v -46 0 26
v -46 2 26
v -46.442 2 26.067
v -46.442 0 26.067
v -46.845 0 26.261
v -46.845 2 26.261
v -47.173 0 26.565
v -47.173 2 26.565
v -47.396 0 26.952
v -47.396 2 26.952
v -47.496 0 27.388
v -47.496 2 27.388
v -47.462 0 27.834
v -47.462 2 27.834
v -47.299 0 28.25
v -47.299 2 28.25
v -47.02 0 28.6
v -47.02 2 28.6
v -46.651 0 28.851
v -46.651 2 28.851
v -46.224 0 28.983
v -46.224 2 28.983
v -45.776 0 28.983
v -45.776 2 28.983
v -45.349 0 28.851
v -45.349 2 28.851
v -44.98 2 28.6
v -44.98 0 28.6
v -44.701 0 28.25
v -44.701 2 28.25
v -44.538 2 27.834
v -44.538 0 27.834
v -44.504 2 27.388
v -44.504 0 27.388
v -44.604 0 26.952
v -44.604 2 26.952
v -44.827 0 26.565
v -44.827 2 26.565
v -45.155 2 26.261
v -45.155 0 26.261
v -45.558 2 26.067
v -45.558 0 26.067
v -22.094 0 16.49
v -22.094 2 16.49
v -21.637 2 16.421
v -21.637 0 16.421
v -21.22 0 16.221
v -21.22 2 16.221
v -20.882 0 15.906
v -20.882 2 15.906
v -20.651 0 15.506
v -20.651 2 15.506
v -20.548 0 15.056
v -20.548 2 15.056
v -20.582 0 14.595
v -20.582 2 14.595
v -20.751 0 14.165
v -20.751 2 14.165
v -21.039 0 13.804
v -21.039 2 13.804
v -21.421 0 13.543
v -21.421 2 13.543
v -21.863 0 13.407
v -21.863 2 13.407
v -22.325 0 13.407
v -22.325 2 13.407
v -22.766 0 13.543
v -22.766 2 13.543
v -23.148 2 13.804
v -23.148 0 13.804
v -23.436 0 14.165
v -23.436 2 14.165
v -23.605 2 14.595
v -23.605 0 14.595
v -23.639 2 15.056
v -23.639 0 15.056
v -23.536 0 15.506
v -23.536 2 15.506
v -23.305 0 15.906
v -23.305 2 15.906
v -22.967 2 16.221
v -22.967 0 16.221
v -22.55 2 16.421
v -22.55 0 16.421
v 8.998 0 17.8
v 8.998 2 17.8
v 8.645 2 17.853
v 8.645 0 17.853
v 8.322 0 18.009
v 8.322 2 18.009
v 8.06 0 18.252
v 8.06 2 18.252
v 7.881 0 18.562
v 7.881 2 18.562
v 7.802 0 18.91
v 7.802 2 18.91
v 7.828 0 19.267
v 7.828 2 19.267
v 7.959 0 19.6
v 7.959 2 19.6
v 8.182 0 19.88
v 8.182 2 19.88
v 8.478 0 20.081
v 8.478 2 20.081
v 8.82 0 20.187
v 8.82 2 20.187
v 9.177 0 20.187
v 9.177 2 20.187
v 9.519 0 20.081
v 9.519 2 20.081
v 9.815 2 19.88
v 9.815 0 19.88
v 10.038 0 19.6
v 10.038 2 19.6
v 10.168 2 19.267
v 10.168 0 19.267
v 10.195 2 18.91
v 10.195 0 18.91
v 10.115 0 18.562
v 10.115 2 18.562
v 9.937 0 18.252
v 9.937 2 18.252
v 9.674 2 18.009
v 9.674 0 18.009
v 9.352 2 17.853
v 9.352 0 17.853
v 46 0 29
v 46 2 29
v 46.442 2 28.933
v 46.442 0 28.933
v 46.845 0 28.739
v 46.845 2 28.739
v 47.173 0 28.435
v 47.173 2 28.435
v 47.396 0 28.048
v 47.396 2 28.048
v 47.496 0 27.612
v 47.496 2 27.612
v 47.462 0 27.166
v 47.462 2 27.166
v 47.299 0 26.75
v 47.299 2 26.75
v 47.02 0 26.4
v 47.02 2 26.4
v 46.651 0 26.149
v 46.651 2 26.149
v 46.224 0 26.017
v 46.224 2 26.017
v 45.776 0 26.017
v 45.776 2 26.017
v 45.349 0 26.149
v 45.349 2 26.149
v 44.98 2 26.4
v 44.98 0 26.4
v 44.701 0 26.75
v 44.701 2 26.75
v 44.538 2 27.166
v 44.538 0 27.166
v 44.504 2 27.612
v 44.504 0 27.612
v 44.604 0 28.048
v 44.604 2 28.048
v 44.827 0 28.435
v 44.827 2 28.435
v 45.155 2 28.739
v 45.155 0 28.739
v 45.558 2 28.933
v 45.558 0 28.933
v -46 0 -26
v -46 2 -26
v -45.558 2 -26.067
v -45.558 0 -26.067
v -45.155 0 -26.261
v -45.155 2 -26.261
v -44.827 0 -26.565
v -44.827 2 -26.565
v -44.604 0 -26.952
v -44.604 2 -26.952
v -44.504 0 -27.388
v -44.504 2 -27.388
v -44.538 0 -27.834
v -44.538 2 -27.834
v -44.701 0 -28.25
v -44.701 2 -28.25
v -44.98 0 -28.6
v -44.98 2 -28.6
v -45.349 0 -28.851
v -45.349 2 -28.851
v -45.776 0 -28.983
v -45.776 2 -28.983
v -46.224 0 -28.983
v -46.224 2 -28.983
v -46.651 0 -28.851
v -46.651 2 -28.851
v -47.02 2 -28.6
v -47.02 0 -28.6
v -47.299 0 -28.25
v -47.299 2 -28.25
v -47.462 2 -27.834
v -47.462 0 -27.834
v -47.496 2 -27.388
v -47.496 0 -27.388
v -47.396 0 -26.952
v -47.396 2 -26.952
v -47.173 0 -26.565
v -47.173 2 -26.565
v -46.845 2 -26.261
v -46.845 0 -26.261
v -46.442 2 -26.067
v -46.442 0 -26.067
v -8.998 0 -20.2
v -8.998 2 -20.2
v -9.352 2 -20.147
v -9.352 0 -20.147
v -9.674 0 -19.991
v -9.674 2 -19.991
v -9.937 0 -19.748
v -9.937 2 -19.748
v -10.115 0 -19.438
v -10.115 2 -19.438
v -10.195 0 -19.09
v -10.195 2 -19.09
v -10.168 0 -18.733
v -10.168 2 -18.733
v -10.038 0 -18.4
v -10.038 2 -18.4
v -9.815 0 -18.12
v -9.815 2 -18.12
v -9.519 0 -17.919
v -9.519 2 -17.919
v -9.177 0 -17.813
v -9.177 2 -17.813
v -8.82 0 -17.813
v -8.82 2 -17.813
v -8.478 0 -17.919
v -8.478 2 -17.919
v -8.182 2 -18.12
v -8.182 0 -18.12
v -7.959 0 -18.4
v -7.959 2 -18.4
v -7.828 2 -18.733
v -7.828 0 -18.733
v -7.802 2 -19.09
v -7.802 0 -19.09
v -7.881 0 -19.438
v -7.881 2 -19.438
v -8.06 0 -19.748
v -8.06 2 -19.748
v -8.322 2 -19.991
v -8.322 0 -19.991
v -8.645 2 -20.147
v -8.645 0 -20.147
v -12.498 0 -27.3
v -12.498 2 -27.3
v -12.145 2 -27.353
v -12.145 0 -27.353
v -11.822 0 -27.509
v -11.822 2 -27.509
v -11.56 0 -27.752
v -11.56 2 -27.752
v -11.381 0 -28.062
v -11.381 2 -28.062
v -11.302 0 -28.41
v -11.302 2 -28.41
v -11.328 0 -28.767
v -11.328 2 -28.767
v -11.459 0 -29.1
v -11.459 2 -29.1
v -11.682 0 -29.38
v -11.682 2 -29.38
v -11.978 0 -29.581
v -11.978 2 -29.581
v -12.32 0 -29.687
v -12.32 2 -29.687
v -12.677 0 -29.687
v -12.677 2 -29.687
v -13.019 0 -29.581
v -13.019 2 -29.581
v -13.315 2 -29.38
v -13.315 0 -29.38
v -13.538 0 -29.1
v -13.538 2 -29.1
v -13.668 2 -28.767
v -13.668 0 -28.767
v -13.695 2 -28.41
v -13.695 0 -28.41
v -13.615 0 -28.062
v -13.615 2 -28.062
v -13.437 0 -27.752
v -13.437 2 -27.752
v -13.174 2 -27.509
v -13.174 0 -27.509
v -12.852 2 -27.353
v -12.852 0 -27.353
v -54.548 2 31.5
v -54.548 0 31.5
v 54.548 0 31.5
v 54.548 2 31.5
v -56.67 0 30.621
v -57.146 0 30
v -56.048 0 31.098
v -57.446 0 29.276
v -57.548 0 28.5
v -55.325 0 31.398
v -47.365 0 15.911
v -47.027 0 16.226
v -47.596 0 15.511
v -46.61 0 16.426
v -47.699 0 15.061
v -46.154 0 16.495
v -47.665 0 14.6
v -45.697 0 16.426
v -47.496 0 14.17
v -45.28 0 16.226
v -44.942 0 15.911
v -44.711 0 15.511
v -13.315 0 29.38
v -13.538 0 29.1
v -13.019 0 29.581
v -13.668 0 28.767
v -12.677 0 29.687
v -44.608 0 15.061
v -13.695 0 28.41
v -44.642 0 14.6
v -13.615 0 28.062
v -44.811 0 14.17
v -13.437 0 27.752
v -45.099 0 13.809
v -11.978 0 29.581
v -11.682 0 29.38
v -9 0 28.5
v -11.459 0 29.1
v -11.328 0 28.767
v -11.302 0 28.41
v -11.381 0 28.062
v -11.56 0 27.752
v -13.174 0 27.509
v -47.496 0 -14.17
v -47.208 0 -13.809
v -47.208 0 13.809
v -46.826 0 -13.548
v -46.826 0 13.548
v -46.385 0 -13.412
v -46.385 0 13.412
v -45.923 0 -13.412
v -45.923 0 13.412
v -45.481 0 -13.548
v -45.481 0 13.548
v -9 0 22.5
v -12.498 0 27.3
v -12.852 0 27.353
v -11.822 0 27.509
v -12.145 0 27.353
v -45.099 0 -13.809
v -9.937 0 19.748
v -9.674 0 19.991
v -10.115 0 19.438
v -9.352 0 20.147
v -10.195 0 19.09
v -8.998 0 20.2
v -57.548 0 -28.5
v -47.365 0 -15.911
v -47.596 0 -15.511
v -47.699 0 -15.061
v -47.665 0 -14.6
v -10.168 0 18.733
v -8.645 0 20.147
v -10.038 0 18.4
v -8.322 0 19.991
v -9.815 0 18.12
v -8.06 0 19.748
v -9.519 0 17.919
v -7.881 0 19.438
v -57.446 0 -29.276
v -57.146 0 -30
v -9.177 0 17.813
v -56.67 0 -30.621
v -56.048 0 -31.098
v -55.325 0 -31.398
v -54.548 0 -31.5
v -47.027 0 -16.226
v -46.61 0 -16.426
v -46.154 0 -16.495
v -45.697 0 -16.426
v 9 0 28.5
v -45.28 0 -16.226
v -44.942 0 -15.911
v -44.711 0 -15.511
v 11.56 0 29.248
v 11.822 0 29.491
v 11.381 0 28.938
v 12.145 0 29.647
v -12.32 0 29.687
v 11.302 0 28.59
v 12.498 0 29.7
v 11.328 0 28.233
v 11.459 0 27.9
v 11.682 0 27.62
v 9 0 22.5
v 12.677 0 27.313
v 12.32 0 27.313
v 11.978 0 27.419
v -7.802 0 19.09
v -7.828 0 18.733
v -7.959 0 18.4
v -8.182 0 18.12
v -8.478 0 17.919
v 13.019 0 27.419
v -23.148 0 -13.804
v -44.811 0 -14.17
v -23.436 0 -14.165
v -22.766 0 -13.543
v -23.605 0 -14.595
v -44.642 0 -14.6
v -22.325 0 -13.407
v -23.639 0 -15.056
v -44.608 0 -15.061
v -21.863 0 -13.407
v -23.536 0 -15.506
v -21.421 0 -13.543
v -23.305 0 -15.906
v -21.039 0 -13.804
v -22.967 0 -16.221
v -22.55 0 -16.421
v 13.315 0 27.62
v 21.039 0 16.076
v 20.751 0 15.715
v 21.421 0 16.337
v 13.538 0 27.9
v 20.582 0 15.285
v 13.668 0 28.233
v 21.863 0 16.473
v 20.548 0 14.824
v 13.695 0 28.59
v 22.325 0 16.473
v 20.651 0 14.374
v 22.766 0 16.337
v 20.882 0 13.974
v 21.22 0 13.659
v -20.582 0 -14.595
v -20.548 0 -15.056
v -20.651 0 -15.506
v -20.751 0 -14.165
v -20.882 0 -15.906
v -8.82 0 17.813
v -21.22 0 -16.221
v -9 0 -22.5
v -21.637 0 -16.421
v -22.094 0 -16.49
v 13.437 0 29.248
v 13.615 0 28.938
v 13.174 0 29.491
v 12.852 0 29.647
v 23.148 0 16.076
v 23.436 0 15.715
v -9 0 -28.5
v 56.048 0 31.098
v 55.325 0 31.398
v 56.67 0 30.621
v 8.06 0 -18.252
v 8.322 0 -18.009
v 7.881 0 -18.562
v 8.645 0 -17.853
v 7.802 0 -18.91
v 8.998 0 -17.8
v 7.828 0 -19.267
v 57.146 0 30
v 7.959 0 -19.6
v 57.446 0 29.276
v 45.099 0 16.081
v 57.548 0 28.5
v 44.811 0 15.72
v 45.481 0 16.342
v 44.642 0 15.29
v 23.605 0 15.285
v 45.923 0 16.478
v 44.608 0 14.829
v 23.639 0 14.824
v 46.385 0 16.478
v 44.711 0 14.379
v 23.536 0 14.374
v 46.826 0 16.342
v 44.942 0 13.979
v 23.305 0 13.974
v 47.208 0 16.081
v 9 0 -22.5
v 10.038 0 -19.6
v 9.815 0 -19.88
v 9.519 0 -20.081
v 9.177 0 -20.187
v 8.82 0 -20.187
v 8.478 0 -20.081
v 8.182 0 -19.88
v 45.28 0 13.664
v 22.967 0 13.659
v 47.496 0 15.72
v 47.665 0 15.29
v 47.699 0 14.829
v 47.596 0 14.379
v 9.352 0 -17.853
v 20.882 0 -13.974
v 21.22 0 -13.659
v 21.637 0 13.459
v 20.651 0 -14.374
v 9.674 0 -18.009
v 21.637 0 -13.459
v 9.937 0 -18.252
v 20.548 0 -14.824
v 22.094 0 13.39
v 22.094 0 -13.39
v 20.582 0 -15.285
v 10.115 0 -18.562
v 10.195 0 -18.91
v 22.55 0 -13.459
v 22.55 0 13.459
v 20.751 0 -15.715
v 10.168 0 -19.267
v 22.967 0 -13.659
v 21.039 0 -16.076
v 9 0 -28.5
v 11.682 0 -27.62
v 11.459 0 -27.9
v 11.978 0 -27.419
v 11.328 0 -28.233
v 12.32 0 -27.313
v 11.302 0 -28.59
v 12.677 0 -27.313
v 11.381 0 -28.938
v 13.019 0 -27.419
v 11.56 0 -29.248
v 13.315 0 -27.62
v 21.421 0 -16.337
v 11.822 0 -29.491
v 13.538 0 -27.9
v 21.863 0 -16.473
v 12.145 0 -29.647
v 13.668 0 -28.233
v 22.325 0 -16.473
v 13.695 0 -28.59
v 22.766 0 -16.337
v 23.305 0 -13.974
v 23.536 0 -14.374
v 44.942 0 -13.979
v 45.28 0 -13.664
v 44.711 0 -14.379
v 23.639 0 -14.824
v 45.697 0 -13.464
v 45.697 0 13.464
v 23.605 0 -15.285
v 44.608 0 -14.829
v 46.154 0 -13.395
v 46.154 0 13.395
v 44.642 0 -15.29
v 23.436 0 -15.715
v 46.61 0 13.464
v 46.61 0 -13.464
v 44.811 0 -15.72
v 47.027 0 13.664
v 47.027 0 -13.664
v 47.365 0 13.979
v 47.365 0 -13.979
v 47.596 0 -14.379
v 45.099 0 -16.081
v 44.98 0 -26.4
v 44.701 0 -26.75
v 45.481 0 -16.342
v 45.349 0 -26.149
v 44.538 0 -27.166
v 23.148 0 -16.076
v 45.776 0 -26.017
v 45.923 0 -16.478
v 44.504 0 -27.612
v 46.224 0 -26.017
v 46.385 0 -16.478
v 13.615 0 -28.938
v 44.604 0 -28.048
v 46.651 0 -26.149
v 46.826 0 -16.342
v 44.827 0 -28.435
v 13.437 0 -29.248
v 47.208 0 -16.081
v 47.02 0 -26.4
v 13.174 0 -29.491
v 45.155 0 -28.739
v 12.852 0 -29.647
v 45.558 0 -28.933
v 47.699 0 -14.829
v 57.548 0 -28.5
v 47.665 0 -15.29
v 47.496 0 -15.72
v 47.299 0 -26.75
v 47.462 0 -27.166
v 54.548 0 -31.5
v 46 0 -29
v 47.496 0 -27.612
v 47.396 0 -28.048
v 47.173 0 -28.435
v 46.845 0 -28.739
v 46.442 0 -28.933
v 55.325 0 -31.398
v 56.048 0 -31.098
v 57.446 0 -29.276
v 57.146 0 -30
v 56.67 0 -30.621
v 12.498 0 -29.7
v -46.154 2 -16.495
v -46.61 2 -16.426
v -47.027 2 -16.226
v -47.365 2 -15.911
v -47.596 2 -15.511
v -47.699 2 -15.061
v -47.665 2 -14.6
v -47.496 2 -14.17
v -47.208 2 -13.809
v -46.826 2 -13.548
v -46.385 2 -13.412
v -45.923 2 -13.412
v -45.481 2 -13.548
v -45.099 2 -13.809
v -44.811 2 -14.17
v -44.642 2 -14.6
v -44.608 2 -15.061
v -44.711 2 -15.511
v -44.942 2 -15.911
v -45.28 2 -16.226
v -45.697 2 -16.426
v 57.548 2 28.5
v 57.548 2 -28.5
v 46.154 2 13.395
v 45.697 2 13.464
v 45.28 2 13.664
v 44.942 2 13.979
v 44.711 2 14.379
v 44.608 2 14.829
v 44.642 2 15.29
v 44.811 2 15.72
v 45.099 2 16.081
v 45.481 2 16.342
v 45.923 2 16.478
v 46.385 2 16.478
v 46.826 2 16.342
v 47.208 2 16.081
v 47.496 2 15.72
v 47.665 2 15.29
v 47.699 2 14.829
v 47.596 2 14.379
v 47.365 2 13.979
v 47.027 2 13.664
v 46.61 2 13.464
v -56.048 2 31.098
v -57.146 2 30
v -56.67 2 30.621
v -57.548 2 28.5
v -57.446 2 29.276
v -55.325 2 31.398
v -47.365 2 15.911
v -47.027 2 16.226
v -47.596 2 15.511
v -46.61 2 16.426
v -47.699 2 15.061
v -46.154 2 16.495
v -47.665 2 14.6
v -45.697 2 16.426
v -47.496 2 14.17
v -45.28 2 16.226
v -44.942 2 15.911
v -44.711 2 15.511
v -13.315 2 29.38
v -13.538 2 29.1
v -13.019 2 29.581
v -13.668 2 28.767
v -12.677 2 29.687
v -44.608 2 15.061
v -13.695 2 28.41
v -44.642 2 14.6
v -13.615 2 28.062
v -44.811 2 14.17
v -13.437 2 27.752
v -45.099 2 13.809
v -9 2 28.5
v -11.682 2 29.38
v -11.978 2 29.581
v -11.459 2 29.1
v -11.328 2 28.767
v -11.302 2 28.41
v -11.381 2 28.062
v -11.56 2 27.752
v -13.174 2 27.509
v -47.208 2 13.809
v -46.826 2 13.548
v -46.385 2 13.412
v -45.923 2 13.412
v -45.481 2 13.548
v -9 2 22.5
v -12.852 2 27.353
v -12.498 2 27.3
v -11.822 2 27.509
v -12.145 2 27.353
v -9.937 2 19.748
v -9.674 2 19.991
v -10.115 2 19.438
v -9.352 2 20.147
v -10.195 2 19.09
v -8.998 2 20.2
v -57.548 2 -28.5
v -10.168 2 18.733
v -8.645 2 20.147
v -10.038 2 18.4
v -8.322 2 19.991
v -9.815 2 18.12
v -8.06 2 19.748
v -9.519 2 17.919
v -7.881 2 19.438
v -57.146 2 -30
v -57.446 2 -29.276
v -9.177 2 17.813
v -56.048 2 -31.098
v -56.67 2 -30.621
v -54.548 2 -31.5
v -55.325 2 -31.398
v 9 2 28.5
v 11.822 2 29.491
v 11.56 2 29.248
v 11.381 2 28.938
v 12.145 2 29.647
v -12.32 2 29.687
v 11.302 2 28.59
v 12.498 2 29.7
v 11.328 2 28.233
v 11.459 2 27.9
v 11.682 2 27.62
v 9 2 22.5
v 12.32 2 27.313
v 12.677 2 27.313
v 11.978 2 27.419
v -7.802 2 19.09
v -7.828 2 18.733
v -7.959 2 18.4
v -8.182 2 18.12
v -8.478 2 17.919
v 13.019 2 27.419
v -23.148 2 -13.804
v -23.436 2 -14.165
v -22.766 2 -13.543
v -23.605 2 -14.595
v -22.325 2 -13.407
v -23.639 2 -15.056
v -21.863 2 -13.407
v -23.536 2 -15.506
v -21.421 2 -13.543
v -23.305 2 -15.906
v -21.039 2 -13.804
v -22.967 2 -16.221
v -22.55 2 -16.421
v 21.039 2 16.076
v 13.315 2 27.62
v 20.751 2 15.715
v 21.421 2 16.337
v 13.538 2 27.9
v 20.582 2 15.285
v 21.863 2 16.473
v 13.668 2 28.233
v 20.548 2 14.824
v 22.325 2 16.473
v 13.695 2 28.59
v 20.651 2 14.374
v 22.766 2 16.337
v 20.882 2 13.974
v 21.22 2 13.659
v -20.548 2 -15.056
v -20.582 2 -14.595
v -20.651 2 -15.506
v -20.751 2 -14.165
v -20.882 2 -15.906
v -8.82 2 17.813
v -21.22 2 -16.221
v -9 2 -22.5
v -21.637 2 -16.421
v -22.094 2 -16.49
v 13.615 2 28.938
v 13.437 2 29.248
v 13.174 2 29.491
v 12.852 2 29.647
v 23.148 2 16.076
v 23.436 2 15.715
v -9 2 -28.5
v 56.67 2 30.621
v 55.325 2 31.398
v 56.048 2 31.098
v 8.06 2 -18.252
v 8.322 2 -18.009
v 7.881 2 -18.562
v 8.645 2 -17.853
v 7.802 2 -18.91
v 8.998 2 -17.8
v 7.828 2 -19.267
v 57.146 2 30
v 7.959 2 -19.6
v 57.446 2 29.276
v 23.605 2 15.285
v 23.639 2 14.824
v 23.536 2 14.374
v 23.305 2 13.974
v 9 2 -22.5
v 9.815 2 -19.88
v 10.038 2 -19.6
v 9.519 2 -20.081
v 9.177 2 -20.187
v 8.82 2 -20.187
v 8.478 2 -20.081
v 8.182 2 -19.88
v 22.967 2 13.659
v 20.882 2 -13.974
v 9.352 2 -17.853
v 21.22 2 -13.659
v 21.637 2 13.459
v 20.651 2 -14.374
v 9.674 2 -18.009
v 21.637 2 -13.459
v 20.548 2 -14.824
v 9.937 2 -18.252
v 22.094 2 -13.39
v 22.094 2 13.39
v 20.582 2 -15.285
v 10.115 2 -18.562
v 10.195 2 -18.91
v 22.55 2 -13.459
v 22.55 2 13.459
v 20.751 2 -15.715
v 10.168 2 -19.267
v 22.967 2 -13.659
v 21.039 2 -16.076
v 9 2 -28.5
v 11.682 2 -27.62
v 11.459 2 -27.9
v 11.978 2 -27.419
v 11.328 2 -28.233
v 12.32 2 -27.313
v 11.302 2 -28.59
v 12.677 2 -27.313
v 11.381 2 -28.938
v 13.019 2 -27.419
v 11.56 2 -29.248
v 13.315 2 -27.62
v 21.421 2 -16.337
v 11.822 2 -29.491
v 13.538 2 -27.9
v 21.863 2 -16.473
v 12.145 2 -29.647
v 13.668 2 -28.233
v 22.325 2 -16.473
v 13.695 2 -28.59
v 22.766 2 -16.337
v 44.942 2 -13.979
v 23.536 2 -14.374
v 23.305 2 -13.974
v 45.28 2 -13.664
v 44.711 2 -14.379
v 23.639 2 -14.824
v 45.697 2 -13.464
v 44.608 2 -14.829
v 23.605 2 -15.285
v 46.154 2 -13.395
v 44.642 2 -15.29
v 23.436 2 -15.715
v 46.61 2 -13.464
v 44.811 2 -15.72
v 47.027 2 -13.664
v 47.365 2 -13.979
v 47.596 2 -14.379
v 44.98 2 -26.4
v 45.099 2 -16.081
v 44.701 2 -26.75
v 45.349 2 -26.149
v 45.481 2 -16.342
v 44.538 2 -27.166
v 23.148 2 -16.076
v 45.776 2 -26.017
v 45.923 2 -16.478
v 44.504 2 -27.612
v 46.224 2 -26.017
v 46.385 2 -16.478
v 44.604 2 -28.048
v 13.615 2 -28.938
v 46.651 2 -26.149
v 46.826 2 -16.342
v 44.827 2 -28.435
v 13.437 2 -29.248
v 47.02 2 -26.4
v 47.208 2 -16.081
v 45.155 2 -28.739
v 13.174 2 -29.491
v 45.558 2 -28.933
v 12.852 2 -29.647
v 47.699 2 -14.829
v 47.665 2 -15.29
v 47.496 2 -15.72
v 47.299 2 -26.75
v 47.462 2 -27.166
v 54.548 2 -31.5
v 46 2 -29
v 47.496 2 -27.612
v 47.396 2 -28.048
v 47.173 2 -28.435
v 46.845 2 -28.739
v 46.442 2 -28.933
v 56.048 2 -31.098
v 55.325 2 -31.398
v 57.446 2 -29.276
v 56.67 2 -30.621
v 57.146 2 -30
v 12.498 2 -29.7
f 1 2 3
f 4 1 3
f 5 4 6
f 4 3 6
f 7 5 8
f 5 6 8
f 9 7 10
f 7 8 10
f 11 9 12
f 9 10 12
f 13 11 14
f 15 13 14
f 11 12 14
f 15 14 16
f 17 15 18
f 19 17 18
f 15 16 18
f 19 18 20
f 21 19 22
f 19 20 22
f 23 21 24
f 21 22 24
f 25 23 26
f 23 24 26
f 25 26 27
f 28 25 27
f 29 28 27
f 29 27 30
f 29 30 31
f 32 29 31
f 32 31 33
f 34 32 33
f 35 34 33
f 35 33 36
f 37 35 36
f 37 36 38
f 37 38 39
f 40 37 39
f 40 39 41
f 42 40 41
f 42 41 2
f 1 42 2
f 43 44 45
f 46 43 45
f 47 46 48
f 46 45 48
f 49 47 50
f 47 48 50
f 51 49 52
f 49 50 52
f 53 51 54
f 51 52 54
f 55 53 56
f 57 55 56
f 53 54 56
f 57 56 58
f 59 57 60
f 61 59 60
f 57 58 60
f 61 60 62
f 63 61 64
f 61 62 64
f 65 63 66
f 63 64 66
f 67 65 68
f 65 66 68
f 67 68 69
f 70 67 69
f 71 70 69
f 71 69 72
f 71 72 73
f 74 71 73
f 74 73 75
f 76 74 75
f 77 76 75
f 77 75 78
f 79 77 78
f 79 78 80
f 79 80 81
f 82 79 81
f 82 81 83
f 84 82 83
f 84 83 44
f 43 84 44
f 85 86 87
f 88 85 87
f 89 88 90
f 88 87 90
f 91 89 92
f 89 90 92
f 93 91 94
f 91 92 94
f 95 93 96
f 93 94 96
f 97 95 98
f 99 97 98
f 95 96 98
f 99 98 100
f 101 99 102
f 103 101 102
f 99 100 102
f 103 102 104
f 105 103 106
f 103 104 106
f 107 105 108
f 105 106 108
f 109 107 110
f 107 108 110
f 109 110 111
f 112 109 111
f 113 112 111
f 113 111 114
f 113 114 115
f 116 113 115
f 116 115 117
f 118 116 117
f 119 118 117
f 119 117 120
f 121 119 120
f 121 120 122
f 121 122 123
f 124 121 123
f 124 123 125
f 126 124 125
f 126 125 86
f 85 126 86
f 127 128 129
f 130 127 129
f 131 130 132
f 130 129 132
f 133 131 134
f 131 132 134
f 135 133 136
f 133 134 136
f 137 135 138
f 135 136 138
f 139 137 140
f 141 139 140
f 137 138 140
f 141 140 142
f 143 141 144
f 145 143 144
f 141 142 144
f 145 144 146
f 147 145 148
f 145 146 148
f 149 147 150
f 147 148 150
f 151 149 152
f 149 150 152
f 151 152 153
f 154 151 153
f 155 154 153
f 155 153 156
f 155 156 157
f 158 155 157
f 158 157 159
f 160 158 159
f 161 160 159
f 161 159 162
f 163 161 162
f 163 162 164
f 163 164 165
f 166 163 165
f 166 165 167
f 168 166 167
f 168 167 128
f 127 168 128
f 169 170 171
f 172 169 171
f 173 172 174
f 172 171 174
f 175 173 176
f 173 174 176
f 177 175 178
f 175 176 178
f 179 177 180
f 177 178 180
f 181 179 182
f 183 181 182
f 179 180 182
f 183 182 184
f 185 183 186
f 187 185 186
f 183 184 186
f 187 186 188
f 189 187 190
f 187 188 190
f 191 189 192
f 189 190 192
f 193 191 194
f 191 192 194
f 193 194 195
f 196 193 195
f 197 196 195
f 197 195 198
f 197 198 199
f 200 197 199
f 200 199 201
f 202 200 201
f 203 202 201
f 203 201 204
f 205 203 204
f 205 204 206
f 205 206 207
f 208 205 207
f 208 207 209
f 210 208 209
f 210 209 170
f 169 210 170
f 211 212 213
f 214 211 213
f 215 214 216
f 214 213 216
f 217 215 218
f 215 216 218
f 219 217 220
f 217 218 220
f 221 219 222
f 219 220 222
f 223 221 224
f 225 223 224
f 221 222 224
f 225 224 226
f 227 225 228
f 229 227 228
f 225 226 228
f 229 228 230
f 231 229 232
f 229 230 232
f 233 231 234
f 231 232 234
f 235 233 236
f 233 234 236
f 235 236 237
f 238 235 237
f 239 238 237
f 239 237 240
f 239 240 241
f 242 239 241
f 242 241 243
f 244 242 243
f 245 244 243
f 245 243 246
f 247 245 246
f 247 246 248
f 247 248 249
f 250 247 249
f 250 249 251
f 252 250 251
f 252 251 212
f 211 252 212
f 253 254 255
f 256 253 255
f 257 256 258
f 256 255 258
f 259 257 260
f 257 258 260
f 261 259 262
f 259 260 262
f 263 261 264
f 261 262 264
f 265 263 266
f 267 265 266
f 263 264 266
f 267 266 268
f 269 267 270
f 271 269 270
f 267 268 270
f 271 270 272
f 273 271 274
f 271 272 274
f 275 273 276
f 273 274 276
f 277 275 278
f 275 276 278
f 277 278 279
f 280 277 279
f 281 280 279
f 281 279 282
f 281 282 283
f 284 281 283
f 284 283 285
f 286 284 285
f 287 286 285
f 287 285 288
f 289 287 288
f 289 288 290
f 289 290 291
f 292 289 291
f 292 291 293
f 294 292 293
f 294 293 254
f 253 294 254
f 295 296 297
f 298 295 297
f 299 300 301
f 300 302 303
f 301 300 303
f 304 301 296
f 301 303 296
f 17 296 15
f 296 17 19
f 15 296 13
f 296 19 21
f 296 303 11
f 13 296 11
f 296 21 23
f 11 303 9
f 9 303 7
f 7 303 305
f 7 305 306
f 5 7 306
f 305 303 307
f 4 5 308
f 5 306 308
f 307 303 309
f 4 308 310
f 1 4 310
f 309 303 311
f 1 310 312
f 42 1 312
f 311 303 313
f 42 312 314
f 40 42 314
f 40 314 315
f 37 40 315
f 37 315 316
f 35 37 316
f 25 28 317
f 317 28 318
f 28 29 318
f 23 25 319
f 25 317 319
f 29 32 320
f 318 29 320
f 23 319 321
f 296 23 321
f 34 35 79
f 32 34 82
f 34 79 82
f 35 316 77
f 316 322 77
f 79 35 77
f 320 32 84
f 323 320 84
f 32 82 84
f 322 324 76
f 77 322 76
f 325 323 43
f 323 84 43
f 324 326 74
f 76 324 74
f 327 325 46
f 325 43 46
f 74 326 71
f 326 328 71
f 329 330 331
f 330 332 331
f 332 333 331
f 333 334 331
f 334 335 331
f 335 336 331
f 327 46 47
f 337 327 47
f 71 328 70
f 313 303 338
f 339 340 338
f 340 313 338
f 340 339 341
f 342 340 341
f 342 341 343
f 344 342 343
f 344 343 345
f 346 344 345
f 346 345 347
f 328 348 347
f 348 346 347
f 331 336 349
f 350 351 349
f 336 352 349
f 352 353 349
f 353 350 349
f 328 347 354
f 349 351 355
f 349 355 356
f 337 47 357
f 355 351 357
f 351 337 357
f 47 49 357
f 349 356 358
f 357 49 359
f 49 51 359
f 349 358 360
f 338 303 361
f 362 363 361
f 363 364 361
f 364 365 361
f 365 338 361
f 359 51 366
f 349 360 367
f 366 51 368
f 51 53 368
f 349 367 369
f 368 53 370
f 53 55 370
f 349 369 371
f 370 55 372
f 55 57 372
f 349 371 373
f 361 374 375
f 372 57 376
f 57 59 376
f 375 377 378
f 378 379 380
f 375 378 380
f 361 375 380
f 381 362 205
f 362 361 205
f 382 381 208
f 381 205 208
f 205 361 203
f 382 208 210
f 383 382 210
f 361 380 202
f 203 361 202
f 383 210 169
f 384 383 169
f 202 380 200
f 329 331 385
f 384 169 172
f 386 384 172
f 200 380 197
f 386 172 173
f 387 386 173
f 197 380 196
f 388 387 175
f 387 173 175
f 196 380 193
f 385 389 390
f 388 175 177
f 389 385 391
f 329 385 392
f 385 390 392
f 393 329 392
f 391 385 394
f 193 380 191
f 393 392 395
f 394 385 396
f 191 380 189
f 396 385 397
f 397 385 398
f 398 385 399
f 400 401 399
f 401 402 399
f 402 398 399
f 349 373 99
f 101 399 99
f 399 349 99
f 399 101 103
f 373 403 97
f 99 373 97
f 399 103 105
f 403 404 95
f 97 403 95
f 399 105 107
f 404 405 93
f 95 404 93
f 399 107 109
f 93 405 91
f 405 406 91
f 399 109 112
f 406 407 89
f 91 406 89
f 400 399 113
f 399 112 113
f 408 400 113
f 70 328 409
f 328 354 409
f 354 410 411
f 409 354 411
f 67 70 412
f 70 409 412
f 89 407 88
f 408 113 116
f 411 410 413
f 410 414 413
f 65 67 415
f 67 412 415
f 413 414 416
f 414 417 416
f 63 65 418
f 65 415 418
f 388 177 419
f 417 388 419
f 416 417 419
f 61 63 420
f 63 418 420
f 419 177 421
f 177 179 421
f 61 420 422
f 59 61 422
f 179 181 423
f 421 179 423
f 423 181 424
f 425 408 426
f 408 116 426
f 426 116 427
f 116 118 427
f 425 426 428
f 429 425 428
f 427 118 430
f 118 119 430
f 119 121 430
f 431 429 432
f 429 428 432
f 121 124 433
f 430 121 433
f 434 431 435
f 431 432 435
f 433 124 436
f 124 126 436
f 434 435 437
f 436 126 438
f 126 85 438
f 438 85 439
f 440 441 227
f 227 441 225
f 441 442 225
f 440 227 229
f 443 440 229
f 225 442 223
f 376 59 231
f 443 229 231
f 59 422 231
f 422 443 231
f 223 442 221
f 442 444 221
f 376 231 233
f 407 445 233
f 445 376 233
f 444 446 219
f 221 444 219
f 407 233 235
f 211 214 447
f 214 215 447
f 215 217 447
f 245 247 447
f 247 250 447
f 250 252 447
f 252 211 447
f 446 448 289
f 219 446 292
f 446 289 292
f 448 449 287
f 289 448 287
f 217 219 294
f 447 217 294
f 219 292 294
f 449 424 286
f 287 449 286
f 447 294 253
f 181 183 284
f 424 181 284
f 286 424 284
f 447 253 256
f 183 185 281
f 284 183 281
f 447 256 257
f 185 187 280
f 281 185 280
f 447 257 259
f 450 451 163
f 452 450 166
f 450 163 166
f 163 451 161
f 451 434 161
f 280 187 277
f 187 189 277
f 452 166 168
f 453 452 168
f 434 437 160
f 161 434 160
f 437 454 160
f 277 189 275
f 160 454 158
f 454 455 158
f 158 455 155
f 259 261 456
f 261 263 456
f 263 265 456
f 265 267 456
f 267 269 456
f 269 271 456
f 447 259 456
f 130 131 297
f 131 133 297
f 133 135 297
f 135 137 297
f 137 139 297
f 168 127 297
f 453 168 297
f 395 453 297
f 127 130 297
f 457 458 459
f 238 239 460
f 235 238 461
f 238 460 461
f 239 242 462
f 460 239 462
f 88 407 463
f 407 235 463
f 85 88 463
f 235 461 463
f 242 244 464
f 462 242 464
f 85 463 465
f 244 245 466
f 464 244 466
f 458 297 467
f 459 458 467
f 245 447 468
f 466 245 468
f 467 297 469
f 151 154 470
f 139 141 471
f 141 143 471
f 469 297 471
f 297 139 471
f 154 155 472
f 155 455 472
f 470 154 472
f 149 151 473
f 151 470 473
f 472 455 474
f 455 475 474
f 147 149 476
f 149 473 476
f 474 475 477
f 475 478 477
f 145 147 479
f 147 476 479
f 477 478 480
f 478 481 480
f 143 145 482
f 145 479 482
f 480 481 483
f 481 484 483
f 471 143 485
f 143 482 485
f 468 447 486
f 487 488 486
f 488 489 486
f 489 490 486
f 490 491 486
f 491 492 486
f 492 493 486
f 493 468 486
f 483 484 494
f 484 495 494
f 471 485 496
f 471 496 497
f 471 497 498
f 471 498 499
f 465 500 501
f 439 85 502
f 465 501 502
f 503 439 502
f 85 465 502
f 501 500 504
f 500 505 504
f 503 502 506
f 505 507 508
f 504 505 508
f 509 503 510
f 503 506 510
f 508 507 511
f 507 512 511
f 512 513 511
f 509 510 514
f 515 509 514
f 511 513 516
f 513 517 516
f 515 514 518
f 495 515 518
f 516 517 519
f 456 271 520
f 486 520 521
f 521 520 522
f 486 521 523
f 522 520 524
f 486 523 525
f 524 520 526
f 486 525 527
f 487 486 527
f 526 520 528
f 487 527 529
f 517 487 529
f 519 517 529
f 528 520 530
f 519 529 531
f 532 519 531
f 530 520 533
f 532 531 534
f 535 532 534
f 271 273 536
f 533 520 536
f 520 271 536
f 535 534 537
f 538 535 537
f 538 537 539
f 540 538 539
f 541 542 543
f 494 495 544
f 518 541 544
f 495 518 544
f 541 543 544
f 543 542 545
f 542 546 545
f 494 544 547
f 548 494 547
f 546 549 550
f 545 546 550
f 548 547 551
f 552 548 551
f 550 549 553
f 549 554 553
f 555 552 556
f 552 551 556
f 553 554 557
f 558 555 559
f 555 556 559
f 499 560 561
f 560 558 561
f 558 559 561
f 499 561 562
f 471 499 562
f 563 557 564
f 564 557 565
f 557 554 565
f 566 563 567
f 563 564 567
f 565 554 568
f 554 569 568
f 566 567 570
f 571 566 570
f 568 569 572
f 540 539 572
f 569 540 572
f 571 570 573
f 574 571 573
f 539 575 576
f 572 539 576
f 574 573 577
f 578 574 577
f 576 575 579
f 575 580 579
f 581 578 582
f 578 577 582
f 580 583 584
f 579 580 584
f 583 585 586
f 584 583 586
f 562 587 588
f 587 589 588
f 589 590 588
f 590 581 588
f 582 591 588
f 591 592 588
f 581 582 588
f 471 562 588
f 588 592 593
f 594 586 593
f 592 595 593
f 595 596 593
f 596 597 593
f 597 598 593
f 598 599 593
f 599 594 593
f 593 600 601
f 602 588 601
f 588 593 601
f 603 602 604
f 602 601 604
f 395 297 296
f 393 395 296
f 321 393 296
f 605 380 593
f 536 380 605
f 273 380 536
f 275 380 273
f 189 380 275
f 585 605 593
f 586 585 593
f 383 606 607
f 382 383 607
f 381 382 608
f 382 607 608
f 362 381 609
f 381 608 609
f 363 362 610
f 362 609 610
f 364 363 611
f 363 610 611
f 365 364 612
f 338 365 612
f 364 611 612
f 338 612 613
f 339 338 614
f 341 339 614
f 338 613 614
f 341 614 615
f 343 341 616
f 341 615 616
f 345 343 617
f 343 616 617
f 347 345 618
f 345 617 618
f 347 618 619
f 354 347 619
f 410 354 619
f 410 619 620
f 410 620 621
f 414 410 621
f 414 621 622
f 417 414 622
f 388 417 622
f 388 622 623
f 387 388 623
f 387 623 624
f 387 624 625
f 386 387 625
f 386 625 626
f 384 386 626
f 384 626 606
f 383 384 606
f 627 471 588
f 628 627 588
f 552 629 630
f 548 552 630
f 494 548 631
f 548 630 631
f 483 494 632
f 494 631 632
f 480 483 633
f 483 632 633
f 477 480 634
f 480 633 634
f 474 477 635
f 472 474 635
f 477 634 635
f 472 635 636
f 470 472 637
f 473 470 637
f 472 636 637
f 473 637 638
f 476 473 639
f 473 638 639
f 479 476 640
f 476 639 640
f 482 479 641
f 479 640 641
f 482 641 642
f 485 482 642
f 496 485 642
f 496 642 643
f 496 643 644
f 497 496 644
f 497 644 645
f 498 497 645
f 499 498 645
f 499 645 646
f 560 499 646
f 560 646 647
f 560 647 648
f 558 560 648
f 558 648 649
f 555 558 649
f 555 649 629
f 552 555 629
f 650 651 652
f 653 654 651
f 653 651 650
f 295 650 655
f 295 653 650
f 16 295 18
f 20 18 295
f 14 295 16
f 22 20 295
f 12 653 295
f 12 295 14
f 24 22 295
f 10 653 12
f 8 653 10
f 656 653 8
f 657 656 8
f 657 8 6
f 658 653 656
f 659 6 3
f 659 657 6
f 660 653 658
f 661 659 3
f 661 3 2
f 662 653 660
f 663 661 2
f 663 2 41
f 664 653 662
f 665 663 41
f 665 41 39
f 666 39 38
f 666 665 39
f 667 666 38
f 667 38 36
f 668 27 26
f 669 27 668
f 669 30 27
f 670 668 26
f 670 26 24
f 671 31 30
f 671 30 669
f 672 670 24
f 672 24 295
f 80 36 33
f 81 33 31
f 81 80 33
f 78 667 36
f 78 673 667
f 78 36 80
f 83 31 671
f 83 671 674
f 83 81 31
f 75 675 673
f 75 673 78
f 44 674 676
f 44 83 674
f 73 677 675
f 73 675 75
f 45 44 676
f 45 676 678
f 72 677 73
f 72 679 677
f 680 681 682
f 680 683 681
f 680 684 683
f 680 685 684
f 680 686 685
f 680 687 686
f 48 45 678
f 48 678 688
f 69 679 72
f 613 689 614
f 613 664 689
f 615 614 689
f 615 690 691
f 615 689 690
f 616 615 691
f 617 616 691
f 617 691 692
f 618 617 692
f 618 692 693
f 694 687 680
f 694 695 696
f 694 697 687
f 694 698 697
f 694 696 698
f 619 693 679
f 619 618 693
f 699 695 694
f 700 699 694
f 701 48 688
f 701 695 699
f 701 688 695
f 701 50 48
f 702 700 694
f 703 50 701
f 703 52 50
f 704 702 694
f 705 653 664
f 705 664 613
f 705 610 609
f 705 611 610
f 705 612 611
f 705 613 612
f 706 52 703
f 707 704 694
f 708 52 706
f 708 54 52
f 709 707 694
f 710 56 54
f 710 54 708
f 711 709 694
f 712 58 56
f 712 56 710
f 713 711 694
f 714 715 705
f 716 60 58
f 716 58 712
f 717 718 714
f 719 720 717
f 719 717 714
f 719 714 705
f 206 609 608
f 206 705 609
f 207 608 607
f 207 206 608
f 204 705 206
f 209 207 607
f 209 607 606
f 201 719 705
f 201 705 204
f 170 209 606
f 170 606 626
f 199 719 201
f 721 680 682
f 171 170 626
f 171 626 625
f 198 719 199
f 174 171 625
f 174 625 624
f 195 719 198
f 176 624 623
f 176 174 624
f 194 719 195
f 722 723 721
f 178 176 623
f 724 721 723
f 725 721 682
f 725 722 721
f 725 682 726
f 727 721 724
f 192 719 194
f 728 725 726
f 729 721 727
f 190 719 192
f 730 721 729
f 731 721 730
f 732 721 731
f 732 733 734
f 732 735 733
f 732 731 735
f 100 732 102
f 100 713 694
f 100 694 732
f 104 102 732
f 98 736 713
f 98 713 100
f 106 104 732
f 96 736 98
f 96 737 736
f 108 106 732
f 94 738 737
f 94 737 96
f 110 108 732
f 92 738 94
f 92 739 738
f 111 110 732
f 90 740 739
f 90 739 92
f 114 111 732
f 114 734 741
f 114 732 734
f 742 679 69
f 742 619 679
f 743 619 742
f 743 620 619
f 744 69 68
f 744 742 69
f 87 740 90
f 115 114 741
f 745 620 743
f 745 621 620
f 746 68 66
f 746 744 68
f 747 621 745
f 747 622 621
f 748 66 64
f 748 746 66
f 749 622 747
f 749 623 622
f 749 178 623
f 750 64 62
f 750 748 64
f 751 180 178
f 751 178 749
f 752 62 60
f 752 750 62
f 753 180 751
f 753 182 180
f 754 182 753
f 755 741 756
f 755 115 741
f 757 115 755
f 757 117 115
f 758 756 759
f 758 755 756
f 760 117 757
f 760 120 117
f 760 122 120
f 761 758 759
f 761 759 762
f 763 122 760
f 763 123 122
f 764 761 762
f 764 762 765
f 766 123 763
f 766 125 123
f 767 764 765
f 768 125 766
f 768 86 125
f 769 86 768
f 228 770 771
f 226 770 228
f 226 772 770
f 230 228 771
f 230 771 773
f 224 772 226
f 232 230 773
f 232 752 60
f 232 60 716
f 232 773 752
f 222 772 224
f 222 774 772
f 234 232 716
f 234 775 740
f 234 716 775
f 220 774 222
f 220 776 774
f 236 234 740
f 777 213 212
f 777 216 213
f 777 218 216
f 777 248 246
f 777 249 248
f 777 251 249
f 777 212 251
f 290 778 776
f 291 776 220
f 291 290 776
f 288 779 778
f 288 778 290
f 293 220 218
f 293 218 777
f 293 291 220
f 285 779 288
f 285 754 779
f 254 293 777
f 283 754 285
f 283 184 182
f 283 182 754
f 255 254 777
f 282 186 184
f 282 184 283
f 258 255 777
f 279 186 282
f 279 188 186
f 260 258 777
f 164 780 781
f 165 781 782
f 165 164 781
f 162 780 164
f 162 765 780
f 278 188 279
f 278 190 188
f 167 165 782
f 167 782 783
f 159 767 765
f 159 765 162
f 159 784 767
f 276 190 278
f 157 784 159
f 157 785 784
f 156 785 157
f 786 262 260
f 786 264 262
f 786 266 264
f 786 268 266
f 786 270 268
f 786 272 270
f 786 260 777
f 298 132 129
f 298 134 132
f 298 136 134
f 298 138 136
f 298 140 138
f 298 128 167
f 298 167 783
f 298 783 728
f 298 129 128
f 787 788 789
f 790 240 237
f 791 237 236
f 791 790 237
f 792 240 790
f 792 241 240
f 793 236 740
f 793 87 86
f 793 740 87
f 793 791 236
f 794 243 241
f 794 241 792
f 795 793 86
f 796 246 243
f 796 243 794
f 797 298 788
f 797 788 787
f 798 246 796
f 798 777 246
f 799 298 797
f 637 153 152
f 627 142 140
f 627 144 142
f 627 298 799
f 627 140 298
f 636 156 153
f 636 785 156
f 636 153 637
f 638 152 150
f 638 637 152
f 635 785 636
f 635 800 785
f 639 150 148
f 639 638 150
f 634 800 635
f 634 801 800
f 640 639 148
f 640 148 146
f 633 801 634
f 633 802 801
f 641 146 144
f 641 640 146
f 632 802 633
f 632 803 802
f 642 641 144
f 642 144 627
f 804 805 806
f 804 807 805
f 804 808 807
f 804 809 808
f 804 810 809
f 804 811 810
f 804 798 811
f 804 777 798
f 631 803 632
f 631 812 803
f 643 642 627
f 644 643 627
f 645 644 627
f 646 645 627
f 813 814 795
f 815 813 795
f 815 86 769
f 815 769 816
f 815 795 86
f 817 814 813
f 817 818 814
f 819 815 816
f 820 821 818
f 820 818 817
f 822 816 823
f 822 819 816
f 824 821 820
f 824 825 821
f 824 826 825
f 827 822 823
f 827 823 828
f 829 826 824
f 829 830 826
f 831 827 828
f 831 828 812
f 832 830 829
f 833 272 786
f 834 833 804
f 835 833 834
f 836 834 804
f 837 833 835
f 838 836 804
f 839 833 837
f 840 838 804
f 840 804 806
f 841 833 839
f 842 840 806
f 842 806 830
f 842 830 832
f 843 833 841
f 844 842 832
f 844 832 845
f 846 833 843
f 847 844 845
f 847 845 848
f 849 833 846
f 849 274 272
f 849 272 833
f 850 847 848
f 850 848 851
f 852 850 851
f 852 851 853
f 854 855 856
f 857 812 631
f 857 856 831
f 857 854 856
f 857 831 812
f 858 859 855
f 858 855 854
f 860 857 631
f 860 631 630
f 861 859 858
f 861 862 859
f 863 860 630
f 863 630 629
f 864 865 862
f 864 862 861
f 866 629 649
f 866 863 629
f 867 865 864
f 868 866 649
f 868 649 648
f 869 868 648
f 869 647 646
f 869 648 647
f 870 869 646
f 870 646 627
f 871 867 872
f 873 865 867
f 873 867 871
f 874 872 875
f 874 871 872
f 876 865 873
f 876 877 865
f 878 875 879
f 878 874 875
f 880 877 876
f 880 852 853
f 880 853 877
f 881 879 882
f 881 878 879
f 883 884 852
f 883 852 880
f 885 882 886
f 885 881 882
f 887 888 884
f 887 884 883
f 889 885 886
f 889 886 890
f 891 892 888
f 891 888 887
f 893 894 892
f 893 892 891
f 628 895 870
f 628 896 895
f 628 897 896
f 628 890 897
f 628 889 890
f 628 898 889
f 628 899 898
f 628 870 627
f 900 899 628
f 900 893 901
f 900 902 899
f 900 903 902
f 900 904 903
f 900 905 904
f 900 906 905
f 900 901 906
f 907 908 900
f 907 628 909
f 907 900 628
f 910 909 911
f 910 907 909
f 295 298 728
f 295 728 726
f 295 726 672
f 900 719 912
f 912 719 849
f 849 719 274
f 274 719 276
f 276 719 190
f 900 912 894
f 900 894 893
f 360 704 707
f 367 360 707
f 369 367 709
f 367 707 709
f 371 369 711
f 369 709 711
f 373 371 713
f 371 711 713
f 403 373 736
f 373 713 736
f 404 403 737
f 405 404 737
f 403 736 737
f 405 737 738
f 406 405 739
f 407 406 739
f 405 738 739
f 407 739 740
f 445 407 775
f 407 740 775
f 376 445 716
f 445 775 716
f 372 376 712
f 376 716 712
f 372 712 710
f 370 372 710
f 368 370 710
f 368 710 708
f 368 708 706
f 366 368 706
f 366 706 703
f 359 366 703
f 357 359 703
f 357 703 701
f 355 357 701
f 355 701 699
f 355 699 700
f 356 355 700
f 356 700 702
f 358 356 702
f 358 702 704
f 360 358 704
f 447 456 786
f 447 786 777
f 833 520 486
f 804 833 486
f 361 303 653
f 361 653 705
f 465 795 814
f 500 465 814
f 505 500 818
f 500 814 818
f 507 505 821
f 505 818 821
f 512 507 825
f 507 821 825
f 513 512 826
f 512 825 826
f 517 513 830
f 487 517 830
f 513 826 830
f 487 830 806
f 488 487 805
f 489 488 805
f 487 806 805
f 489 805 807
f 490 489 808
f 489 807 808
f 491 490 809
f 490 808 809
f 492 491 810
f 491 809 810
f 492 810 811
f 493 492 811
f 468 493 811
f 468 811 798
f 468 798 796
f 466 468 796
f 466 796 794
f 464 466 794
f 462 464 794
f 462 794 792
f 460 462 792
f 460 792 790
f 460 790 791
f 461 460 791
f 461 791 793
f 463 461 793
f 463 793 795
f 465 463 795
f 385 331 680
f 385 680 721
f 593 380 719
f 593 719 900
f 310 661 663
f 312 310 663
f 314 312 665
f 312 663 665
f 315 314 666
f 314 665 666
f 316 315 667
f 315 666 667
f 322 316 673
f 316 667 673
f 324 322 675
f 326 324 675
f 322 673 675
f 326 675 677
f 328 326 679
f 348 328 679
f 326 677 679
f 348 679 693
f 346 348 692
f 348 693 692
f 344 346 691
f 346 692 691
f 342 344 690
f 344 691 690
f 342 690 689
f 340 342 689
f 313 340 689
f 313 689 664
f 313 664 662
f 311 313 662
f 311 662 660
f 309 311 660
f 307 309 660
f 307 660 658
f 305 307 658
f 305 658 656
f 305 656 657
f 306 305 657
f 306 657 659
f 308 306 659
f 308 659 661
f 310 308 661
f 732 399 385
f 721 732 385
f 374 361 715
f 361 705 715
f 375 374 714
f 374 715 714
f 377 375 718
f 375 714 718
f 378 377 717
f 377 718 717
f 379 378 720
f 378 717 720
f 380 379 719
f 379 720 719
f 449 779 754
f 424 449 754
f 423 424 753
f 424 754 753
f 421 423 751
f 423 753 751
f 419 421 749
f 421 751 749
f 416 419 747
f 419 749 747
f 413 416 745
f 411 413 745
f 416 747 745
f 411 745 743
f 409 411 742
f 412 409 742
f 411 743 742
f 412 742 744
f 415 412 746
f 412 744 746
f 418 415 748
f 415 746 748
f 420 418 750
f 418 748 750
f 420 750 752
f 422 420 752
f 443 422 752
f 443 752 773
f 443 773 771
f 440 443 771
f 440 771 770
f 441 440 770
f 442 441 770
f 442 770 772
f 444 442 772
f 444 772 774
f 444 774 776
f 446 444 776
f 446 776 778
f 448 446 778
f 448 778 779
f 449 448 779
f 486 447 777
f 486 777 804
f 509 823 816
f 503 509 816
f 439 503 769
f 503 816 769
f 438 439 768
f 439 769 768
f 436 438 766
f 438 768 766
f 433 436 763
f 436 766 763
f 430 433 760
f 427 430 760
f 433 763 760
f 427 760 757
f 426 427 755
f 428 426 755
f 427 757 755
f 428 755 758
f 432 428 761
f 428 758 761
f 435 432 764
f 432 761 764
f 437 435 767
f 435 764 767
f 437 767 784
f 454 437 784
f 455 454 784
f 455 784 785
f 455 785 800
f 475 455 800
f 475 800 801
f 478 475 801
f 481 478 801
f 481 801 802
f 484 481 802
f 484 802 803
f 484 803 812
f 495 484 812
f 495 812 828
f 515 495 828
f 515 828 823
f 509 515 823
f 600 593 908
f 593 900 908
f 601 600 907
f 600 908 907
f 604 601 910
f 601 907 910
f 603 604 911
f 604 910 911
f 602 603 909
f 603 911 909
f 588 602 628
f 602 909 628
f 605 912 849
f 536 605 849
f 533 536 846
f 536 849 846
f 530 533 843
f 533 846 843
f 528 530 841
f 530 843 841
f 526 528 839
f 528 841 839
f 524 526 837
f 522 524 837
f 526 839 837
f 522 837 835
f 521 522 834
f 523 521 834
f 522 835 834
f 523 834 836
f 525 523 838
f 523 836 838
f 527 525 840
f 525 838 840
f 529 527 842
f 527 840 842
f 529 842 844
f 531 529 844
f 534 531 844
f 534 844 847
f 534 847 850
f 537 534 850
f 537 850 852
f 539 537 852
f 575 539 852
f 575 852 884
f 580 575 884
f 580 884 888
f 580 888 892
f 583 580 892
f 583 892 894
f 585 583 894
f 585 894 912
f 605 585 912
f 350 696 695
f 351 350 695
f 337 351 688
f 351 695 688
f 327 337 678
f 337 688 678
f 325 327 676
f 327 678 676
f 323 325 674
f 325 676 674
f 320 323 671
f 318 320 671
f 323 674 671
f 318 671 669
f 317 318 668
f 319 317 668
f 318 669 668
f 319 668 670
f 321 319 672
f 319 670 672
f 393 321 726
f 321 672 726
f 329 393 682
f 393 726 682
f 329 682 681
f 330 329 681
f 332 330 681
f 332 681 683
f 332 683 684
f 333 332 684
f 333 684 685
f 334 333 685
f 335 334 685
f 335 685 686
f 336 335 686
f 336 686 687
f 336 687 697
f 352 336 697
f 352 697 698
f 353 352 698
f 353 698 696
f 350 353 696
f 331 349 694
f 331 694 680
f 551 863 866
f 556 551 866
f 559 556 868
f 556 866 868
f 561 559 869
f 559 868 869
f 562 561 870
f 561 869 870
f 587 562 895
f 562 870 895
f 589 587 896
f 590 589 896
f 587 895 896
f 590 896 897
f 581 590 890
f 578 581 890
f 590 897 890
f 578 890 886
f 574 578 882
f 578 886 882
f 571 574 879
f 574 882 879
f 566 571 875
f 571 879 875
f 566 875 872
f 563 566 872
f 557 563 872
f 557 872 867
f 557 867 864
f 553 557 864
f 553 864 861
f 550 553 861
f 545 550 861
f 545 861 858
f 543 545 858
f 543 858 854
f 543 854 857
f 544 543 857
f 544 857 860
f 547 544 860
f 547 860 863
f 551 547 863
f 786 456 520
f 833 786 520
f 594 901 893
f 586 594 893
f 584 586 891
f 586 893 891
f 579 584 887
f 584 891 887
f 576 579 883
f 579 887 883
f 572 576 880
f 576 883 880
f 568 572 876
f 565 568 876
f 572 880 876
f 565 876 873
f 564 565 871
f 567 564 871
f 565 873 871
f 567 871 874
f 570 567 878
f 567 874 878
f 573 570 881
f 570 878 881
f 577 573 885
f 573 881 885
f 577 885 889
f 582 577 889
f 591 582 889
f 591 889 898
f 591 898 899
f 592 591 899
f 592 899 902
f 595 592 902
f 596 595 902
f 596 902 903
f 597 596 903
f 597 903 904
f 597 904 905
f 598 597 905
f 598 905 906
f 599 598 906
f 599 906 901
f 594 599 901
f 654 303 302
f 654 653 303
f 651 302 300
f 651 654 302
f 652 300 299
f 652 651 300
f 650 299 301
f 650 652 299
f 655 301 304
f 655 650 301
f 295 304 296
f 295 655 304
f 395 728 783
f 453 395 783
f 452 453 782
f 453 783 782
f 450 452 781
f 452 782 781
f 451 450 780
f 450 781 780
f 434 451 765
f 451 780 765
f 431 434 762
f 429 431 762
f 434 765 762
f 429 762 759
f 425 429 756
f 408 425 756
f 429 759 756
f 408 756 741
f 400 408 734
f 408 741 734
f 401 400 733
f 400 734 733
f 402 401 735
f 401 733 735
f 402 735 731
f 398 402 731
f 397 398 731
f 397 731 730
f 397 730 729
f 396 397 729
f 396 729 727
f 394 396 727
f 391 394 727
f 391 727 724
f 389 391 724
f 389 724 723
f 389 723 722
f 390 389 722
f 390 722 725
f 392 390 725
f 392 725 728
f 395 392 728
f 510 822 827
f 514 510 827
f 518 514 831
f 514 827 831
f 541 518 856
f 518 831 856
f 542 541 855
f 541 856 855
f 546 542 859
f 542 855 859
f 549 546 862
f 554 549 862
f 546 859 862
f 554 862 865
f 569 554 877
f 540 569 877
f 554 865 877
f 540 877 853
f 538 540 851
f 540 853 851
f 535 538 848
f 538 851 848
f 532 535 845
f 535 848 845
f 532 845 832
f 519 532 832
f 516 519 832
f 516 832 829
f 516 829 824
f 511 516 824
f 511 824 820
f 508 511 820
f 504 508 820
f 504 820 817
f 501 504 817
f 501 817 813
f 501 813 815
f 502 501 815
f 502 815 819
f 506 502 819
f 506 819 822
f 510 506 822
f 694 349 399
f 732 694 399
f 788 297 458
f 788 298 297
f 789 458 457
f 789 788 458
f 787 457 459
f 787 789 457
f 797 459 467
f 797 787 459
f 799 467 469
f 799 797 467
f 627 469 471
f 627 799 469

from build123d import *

# Parameters (mm, degrees)
ESBO_O1_W                = 115.09677689
ESBO_O1_H                = 63
RESSALTO_EXTRUS_O1_DEPTH = 2
ESBO_O2_R                = 1.55
CORTE_EXTRUS_O1_DEPTH    = 66.635866816
ESBO_O3_W                = 18
ESBO_O3_H                = 6
CORTE_EXTRUS_O2_DEPTH    = 66.635866816
FILETE1_R                = 3
ESBO_O8_R                = 1.2
CORTE_EXTRUS_O4_DEPTH    = 66.635866816
ESBO_O9_R                = 1.5
CORTE_EXTRUS_O5_DEPTH    = 66.635866816


with BuildPart() as part:
    # Esboço1 → Ressalto-extrusão1 (new body)
    with BuildSketch(Plane(origin=(0, 0, 0), x_dir=(1, 0, 0), z_dir=(0, 1, 0))):
        Rectangle(ESBO_O1_W, ESBO_O1_H)
    extrude(amount=RESSALTO_EXTRUS_O1_DEPTH)

    # Esboço2 → Corte-extrusão1 (cut, through all)
    with BuildSketch(Plane(origin=(0, 2, 0), x_dir=(1, 0, 0), z_dir=(0, 1, 0))):
        with Locations(Location((-46.153556516, -14.945, 0), (0, 0, 270))):
            Circle(ESBO_O2_R)
        with Locations(Location((-22.093556516, -14.94, 0), (0, 0, 270))):
            Circle(ESBO_O2_R)
        with Locations(Location((22.093556516, -14.94, 0), (0, 0, 90))):
            Circle(ESBO_O2_R)
        with Locations(Location((46.153556516, -14.945, 0), (0, 0, 90))):
            Circle(ESBO_O2_R)
        with Locations(Location((46.153556516, 14.945, 0), (0, 0, 270))):
            Circle(ESBO_O2_R)
        with Locations(Location((22.093556516, 14.94, 0), (0, 0, 270))):
            Circle(ESBO_O2_R)
        with Locations(Location((-22.093556516, 14.94, 0), (0, 0, 90))):
            Circle(ESBO_O2_R)
        with Locations(Location((-46.153556516, 14.945, 0), (0, 0, 90))):
            Circle(ESBO_O2_R)
    extrude(amount=-CORTE_EXTRUS_O1_DEPTH, mode=Mode.SUBTRACT)

    # Esboço3 → Corte-extrusão2 (cut, through all)
    with BuildSketch(Plane.XZ):
        with Locations((0, 25.5)):
            Rectangle(ESBO_O3_W, ESBO_O3_H)
        with Locations((0, -25.5)):
            Rectangle(ESBO_O3_W, ESBO_O3_H)
    extrude(amount=-CORTE_EXTRUS_O2_DEPTH, mode=Mode.SUBTRACT)

    # Filete1
    filete1_edges = [part.edges().sort_by_distance(p)[0] for p in [
        (-57.548388445, 1, -31.5),
        (57.548388445, 1, -31.5),
        (57.548388445, 1, 31.5),
        (-57.548388445, 1, 31.5),
    ]]
    fillet(filete1_edges, radius=FILETE1_R)

    # Esboço8 → Corte-extrusão4 (cut, through all)
    with BuildSketch(Plane(origin=(0, 2, 0), x_dir=(1, 0, 0), z_dir=(0, 1, 0))):
        with Locations(Location((-12.498388445, 28.5, 0), (0, 0, 270))):
            Circle(ESBO_O8_R)
        with Locations(Location((12.498388445, 28.5, 0), (0, 0, 90))):
            Circle(ESBO_O8_R)
        with Locations(Location((12.498388445, -28.5, 0), (0, 0, 270))):
            Circle(ESBO_O8_R)
        with Locations(Location((-12.498388445, -28.5, 0), (0, 0, 90))):
            Circle(ESBO_O8_R)
        with Locations(Location((-8.998388445, -19, 0), (0, 0, 270))):
            Circle(ESBO_O8_R)
        with Locations(Location((8.998388445, -19, 0), (0, 0, 90))):
            Circle(ESBO_O8_R)
        with Locations(Location((8.998388445, 19, 0), (0, 0, 270))):
            Circle(ESBO_O8_R)
        with Locations(Location((-8.998388445, 19, 0), (0, 0, 90))):
            Circle(ESBO_O8_R)
    extrude(amount=-CORTE_EXTRUS_O4_DEPTH, mode=Mode.SUBTRACT)

    # Esboço9 → Corte-extrusão5 (cut, through all)
    with BuildSketch(Plane(origin=(0, 2, 0), x_dir=(1, 0, 0), z_dir=(0, 1, 0))):
        with Locations(Location((-46, 27.5, 0), (0, 0, 270))):
            Circle(ESBO_O9_R)
        with Locations(Location((46, 27.5, 0), (0, 0, 90))):
            Circle(ESBO_O9_R)
        with Locations(Location((46, -27.5, 0), (0, 0, 270))):
            Circle(ESBO_O9_R)
        with Locations(Location((-46, -27.5, 0), (0, 0, 90))):
            Circle(ESBO_O9_R)
    extrude(amount=-CORTE_EXTRUS_O5_DEPTH, mode=Mode.SUBTRACT)


solid = part.part
